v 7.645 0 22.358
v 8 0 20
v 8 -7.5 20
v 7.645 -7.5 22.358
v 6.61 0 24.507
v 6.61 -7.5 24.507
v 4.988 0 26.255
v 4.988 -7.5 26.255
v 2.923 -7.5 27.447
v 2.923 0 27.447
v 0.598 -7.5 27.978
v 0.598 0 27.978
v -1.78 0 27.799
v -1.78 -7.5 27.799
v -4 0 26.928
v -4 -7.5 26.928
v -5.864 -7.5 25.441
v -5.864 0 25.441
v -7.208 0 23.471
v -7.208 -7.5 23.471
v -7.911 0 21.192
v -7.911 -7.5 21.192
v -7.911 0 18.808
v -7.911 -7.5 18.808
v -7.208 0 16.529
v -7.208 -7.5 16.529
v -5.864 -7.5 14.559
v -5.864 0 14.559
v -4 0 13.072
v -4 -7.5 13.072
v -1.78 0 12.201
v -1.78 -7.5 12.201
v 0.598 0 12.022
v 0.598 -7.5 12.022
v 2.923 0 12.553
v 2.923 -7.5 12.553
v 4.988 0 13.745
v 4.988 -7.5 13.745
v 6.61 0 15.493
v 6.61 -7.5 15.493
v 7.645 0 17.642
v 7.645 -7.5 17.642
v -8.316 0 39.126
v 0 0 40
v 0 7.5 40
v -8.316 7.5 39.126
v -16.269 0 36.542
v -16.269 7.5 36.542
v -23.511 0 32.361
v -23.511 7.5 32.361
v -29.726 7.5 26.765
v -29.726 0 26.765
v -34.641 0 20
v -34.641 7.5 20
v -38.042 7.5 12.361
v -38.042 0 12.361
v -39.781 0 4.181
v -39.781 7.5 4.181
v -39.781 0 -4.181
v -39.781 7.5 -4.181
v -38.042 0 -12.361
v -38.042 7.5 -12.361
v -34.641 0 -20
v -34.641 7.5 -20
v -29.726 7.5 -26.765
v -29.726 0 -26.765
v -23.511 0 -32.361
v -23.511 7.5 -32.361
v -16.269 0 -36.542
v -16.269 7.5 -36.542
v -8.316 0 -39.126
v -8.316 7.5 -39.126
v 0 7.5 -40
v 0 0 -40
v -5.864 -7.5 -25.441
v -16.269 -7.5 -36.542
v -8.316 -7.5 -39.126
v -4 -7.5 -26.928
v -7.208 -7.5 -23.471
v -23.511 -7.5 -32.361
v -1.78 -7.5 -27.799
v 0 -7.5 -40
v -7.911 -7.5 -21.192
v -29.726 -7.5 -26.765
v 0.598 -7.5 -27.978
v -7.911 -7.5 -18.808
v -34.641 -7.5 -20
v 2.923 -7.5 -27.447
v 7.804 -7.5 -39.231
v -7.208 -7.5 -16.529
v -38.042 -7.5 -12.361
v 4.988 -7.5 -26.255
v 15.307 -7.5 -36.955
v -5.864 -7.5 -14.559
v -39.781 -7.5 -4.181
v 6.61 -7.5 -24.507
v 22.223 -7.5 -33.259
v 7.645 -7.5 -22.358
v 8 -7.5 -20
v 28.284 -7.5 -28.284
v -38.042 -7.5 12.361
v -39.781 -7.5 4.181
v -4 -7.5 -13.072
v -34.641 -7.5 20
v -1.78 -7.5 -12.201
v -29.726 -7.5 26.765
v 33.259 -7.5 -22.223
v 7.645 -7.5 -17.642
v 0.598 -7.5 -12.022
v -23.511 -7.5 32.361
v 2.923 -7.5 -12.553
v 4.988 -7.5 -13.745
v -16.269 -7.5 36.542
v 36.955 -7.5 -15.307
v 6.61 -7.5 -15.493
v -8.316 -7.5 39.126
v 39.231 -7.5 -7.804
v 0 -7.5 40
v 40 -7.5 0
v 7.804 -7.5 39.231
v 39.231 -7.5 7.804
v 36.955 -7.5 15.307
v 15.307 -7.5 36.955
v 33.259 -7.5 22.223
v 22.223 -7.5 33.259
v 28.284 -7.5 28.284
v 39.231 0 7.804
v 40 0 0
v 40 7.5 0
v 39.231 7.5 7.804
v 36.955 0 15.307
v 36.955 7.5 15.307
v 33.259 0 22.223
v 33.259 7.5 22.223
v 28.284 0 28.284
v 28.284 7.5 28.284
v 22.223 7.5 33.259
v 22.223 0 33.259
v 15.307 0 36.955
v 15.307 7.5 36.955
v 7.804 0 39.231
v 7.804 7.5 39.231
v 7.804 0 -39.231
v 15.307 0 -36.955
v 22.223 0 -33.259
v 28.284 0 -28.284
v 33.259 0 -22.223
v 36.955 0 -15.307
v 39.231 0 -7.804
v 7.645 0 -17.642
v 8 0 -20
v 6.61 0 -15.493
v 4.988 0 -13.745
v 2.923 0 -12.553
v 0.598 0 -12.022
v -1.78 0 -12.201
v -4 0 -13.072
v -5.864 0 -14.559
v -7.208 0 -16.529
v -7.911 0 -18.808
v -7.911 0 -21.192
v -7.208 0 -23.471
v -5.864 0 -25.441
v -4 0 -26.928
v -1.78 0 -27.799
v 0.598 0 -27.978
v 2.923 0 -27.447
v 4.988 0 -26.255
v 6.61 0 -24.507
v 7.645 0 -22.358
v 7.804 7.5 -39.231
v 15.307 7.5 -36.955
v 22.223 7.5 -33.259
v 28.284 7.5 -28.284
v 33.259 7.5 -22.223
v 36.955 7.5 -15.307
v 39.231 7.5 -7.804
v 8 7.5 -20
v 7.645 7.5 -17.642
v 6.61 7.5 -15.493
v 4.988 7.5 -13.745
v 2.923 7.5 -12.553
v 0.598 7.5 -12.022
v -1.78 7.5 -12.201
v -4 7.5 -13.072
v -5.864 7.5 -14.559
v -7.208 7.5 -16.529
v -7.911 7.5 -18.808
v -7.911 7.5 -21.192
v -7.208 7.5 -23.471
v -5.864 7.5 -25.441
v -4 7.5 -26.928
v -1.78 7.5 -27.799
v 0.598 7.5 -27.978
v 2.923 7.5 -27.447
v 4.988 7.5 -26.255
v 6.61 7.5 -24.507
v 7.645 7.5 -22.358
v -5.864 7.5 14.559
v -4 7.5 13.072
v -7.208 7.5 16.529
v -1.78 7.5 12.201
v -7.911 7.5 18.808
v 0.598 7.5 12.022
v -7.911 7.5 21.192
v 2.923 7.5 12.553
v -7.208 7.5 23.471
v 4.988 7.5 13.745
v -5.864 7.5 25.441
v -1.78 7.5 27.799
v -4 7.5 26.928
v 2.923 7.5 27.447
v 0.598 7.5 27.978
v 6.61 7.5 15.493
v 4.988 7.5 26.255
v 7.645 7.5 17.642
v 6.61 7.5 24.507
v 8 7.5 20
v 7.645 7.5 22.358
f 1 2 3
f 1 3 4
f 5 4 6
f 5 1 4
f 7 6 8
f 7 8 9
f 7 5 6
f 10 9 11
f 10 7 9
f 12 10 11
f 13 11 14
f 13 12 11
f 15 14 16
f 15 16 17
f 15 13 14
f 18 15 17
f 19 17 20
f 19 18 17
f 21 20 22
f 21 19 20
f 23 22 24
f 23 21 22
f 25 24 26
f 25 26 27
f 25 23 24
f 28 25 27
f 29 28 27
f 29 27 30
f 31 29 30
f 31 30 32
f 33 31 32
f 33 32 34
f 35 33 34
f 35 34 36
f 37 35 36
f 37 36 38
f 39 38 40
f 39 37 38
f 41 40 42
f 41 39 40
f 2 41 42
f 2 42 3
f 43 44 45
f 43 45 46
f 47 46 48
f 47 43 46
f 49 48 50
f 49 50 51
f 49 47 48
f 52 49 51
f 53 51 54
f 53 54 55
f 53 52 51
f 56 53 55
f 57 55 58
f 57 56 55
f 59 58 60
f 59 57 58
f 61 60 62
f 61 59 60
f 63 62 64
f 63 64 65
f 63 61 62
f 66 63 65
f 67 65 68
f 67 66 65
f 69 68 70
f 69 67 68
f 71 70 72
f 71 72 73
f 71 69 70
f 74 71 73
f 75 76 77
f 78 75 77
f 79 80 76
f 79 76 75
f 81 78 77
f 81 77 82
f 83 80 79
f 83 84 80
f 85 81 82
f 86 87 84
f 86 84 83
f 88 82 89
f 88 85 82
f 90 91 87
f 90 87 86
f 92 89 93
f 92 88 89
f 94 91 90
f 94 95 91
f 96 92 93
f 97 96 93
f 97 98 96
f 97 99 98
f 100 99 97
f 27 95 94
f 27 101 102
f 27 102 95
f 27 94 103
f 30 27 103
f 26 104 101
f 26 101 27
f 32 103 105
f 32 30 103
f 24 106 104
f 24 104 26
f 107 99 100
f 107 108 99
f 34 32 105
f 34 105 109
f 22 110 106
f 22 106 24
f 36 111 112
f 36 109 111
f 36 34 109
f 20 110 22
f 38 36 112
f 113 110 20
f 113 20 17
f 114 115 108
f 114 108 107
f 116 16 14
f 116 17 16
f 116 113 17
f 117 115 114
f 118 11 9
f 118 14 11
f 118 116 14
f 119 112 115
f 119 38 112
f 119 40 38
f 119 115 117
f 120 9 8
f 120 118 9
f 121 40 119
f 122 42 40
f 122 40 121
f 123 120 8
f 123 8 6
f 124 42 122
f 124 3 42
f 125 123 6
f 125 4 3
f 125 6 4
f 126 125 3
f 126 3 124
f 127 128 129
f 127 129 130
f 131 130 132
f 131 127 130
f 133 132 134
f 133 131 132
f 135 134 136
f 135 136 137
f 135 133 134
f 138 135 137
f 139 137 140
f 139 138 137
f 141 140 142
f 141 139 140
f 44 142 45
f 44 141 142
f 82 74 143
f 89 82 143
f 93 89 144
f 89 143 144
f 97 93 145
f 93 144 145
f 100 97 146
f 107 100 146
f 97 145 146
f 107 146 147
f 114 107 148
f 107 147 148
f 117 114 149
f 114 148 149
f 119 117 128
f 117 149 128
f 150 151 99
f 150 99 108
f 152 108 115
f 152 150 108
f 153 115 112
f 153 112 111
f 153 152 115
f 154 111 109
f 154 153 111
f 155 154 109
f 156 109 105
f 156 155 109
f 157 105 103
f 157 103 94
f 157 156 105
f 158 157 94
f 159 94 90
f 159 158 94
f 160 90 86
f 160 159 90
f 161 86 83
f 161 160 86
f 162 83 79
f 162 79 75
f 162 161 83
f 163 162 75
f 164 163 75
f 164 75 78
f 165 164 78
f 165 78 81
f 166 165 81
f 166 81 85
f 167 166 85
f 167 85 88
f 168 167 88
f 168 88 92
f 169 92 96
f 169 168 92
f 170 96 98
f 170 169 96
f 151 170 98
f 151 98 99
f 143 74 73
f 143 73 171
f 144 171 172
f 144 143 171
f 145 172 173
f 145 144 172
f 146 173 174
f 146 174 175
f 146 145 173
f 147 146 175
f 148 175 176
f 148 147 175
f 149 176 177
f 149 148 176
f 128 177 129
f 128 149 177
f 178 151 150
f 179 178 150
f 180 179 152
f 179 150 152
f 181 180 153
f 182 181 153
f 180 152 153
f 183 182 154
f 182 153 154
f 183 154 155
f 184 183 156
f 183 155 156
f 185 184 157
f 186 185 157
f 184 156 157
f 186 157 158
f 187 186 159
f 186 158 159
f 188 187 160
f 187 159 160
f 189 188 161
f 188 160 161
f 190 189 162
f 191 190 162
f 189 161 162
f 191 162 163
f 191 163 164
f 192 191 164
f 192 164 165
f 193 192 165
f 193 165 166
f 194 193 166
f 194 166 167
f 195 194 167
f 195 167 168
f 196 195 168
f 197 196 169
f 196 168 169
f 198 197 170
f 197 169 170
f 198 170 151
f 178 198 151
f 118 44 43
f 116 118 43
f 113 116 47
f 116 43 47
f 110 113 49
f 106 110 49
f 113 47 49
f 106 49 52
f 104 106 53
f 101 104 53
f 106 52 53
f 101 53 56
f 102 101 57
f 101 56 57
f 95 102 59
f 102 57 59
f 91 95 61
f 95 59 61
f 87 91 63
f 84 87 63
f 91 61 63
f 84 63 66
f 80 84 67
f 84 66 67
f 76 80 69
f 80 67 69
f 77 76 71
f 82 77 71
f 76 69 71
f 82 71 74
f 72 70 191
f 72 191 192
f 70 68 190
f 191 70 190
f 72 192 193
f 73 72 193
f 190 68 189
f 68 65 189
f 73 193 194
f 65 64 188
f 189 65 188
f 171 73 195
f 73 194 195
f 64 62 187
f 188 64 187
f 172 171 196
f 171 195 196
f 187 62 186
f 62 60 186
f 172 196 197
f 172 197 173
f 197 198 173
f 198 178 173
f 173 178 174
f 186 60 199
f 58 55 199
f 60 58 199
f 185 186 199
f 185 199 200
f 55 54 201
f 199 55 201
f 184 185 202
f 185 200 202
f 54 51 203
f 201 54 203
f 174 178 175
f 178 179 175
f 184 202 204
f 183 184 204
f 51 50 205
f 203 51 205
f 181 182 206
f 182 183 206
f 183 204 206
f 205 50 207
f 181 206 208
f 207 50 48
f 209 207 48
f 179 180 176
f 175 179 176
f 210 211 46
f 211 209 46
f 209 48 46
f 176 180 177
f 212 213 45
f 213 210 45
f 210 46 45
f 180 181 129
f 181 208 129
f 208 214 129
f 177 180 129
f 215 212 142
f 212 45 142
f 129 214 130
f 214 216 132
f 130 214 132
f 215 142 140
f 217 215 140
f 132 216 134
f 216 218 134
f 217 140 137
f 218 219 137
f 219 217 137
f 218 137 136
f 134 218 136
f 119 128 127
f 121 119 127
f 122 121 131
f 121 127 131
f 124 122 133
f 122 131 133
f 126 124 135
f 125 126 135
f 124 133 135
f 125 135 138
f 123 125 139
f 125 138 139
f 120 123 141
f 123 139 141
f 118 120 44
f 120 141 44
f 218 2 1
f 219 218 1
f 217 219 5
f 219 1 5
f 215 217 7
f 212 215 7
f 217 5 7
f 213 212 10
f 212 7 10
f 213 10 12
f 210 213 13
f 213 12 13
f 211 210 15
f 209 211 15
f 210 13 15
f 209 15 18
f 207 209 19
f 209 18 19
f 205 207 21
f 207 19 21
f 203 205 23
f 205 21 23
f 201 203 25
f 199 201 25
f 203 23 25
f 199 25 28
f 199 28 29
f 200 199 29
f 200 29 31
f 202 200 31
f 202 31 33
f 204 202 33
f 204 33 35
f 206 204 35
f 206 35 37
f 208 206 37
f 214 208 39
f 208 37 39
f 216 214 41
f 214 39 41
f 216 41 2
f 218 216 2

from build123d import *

# Parameters (mm, degrees)
F0_R     = 8
F1_DEPTH = 7.5


# Not quite as in the source:
# - the program builds the solid bodies; features that only make, move or delete a surface that nothing else refers to are left out


with BuildPart() as f1:
    # F0 (on Front) → F1 (new body, symmetric)
    with BuildSketch(Plane.XZ):
        with BuildLine():
            ThreePointArc((0, -40), (28.2842712475, -28.2842712475), (40, 0))
            ThreePointArc((40, 0), (28.2842712475, 28.2842712475), (0, 40))
            ThreePointArc((0, 40), (-20, 20), (0, 0))
            ThreePointArc((0, 0), (20, -20), (0, -40))
        make_face()
        with Locations((0, 20)):
            Circle(F0_R, mode=Mode.SUBTRACT)
        with BuildLine():
            ThreePointArc((0, 0), (-20, 20), (0, 40))
            ThreePointArc((0, 40), (-40, 0), (0, -40))
            ThreePointArc((0, -40), (20, -20), (0, 0))
        make_face()
        with Locations((0, -20)):
            Circle(F0_R, mode=Mode.SUBTRACT)
    extrude(amount=F1_DEPTH, both=True)


solid = f1.part
